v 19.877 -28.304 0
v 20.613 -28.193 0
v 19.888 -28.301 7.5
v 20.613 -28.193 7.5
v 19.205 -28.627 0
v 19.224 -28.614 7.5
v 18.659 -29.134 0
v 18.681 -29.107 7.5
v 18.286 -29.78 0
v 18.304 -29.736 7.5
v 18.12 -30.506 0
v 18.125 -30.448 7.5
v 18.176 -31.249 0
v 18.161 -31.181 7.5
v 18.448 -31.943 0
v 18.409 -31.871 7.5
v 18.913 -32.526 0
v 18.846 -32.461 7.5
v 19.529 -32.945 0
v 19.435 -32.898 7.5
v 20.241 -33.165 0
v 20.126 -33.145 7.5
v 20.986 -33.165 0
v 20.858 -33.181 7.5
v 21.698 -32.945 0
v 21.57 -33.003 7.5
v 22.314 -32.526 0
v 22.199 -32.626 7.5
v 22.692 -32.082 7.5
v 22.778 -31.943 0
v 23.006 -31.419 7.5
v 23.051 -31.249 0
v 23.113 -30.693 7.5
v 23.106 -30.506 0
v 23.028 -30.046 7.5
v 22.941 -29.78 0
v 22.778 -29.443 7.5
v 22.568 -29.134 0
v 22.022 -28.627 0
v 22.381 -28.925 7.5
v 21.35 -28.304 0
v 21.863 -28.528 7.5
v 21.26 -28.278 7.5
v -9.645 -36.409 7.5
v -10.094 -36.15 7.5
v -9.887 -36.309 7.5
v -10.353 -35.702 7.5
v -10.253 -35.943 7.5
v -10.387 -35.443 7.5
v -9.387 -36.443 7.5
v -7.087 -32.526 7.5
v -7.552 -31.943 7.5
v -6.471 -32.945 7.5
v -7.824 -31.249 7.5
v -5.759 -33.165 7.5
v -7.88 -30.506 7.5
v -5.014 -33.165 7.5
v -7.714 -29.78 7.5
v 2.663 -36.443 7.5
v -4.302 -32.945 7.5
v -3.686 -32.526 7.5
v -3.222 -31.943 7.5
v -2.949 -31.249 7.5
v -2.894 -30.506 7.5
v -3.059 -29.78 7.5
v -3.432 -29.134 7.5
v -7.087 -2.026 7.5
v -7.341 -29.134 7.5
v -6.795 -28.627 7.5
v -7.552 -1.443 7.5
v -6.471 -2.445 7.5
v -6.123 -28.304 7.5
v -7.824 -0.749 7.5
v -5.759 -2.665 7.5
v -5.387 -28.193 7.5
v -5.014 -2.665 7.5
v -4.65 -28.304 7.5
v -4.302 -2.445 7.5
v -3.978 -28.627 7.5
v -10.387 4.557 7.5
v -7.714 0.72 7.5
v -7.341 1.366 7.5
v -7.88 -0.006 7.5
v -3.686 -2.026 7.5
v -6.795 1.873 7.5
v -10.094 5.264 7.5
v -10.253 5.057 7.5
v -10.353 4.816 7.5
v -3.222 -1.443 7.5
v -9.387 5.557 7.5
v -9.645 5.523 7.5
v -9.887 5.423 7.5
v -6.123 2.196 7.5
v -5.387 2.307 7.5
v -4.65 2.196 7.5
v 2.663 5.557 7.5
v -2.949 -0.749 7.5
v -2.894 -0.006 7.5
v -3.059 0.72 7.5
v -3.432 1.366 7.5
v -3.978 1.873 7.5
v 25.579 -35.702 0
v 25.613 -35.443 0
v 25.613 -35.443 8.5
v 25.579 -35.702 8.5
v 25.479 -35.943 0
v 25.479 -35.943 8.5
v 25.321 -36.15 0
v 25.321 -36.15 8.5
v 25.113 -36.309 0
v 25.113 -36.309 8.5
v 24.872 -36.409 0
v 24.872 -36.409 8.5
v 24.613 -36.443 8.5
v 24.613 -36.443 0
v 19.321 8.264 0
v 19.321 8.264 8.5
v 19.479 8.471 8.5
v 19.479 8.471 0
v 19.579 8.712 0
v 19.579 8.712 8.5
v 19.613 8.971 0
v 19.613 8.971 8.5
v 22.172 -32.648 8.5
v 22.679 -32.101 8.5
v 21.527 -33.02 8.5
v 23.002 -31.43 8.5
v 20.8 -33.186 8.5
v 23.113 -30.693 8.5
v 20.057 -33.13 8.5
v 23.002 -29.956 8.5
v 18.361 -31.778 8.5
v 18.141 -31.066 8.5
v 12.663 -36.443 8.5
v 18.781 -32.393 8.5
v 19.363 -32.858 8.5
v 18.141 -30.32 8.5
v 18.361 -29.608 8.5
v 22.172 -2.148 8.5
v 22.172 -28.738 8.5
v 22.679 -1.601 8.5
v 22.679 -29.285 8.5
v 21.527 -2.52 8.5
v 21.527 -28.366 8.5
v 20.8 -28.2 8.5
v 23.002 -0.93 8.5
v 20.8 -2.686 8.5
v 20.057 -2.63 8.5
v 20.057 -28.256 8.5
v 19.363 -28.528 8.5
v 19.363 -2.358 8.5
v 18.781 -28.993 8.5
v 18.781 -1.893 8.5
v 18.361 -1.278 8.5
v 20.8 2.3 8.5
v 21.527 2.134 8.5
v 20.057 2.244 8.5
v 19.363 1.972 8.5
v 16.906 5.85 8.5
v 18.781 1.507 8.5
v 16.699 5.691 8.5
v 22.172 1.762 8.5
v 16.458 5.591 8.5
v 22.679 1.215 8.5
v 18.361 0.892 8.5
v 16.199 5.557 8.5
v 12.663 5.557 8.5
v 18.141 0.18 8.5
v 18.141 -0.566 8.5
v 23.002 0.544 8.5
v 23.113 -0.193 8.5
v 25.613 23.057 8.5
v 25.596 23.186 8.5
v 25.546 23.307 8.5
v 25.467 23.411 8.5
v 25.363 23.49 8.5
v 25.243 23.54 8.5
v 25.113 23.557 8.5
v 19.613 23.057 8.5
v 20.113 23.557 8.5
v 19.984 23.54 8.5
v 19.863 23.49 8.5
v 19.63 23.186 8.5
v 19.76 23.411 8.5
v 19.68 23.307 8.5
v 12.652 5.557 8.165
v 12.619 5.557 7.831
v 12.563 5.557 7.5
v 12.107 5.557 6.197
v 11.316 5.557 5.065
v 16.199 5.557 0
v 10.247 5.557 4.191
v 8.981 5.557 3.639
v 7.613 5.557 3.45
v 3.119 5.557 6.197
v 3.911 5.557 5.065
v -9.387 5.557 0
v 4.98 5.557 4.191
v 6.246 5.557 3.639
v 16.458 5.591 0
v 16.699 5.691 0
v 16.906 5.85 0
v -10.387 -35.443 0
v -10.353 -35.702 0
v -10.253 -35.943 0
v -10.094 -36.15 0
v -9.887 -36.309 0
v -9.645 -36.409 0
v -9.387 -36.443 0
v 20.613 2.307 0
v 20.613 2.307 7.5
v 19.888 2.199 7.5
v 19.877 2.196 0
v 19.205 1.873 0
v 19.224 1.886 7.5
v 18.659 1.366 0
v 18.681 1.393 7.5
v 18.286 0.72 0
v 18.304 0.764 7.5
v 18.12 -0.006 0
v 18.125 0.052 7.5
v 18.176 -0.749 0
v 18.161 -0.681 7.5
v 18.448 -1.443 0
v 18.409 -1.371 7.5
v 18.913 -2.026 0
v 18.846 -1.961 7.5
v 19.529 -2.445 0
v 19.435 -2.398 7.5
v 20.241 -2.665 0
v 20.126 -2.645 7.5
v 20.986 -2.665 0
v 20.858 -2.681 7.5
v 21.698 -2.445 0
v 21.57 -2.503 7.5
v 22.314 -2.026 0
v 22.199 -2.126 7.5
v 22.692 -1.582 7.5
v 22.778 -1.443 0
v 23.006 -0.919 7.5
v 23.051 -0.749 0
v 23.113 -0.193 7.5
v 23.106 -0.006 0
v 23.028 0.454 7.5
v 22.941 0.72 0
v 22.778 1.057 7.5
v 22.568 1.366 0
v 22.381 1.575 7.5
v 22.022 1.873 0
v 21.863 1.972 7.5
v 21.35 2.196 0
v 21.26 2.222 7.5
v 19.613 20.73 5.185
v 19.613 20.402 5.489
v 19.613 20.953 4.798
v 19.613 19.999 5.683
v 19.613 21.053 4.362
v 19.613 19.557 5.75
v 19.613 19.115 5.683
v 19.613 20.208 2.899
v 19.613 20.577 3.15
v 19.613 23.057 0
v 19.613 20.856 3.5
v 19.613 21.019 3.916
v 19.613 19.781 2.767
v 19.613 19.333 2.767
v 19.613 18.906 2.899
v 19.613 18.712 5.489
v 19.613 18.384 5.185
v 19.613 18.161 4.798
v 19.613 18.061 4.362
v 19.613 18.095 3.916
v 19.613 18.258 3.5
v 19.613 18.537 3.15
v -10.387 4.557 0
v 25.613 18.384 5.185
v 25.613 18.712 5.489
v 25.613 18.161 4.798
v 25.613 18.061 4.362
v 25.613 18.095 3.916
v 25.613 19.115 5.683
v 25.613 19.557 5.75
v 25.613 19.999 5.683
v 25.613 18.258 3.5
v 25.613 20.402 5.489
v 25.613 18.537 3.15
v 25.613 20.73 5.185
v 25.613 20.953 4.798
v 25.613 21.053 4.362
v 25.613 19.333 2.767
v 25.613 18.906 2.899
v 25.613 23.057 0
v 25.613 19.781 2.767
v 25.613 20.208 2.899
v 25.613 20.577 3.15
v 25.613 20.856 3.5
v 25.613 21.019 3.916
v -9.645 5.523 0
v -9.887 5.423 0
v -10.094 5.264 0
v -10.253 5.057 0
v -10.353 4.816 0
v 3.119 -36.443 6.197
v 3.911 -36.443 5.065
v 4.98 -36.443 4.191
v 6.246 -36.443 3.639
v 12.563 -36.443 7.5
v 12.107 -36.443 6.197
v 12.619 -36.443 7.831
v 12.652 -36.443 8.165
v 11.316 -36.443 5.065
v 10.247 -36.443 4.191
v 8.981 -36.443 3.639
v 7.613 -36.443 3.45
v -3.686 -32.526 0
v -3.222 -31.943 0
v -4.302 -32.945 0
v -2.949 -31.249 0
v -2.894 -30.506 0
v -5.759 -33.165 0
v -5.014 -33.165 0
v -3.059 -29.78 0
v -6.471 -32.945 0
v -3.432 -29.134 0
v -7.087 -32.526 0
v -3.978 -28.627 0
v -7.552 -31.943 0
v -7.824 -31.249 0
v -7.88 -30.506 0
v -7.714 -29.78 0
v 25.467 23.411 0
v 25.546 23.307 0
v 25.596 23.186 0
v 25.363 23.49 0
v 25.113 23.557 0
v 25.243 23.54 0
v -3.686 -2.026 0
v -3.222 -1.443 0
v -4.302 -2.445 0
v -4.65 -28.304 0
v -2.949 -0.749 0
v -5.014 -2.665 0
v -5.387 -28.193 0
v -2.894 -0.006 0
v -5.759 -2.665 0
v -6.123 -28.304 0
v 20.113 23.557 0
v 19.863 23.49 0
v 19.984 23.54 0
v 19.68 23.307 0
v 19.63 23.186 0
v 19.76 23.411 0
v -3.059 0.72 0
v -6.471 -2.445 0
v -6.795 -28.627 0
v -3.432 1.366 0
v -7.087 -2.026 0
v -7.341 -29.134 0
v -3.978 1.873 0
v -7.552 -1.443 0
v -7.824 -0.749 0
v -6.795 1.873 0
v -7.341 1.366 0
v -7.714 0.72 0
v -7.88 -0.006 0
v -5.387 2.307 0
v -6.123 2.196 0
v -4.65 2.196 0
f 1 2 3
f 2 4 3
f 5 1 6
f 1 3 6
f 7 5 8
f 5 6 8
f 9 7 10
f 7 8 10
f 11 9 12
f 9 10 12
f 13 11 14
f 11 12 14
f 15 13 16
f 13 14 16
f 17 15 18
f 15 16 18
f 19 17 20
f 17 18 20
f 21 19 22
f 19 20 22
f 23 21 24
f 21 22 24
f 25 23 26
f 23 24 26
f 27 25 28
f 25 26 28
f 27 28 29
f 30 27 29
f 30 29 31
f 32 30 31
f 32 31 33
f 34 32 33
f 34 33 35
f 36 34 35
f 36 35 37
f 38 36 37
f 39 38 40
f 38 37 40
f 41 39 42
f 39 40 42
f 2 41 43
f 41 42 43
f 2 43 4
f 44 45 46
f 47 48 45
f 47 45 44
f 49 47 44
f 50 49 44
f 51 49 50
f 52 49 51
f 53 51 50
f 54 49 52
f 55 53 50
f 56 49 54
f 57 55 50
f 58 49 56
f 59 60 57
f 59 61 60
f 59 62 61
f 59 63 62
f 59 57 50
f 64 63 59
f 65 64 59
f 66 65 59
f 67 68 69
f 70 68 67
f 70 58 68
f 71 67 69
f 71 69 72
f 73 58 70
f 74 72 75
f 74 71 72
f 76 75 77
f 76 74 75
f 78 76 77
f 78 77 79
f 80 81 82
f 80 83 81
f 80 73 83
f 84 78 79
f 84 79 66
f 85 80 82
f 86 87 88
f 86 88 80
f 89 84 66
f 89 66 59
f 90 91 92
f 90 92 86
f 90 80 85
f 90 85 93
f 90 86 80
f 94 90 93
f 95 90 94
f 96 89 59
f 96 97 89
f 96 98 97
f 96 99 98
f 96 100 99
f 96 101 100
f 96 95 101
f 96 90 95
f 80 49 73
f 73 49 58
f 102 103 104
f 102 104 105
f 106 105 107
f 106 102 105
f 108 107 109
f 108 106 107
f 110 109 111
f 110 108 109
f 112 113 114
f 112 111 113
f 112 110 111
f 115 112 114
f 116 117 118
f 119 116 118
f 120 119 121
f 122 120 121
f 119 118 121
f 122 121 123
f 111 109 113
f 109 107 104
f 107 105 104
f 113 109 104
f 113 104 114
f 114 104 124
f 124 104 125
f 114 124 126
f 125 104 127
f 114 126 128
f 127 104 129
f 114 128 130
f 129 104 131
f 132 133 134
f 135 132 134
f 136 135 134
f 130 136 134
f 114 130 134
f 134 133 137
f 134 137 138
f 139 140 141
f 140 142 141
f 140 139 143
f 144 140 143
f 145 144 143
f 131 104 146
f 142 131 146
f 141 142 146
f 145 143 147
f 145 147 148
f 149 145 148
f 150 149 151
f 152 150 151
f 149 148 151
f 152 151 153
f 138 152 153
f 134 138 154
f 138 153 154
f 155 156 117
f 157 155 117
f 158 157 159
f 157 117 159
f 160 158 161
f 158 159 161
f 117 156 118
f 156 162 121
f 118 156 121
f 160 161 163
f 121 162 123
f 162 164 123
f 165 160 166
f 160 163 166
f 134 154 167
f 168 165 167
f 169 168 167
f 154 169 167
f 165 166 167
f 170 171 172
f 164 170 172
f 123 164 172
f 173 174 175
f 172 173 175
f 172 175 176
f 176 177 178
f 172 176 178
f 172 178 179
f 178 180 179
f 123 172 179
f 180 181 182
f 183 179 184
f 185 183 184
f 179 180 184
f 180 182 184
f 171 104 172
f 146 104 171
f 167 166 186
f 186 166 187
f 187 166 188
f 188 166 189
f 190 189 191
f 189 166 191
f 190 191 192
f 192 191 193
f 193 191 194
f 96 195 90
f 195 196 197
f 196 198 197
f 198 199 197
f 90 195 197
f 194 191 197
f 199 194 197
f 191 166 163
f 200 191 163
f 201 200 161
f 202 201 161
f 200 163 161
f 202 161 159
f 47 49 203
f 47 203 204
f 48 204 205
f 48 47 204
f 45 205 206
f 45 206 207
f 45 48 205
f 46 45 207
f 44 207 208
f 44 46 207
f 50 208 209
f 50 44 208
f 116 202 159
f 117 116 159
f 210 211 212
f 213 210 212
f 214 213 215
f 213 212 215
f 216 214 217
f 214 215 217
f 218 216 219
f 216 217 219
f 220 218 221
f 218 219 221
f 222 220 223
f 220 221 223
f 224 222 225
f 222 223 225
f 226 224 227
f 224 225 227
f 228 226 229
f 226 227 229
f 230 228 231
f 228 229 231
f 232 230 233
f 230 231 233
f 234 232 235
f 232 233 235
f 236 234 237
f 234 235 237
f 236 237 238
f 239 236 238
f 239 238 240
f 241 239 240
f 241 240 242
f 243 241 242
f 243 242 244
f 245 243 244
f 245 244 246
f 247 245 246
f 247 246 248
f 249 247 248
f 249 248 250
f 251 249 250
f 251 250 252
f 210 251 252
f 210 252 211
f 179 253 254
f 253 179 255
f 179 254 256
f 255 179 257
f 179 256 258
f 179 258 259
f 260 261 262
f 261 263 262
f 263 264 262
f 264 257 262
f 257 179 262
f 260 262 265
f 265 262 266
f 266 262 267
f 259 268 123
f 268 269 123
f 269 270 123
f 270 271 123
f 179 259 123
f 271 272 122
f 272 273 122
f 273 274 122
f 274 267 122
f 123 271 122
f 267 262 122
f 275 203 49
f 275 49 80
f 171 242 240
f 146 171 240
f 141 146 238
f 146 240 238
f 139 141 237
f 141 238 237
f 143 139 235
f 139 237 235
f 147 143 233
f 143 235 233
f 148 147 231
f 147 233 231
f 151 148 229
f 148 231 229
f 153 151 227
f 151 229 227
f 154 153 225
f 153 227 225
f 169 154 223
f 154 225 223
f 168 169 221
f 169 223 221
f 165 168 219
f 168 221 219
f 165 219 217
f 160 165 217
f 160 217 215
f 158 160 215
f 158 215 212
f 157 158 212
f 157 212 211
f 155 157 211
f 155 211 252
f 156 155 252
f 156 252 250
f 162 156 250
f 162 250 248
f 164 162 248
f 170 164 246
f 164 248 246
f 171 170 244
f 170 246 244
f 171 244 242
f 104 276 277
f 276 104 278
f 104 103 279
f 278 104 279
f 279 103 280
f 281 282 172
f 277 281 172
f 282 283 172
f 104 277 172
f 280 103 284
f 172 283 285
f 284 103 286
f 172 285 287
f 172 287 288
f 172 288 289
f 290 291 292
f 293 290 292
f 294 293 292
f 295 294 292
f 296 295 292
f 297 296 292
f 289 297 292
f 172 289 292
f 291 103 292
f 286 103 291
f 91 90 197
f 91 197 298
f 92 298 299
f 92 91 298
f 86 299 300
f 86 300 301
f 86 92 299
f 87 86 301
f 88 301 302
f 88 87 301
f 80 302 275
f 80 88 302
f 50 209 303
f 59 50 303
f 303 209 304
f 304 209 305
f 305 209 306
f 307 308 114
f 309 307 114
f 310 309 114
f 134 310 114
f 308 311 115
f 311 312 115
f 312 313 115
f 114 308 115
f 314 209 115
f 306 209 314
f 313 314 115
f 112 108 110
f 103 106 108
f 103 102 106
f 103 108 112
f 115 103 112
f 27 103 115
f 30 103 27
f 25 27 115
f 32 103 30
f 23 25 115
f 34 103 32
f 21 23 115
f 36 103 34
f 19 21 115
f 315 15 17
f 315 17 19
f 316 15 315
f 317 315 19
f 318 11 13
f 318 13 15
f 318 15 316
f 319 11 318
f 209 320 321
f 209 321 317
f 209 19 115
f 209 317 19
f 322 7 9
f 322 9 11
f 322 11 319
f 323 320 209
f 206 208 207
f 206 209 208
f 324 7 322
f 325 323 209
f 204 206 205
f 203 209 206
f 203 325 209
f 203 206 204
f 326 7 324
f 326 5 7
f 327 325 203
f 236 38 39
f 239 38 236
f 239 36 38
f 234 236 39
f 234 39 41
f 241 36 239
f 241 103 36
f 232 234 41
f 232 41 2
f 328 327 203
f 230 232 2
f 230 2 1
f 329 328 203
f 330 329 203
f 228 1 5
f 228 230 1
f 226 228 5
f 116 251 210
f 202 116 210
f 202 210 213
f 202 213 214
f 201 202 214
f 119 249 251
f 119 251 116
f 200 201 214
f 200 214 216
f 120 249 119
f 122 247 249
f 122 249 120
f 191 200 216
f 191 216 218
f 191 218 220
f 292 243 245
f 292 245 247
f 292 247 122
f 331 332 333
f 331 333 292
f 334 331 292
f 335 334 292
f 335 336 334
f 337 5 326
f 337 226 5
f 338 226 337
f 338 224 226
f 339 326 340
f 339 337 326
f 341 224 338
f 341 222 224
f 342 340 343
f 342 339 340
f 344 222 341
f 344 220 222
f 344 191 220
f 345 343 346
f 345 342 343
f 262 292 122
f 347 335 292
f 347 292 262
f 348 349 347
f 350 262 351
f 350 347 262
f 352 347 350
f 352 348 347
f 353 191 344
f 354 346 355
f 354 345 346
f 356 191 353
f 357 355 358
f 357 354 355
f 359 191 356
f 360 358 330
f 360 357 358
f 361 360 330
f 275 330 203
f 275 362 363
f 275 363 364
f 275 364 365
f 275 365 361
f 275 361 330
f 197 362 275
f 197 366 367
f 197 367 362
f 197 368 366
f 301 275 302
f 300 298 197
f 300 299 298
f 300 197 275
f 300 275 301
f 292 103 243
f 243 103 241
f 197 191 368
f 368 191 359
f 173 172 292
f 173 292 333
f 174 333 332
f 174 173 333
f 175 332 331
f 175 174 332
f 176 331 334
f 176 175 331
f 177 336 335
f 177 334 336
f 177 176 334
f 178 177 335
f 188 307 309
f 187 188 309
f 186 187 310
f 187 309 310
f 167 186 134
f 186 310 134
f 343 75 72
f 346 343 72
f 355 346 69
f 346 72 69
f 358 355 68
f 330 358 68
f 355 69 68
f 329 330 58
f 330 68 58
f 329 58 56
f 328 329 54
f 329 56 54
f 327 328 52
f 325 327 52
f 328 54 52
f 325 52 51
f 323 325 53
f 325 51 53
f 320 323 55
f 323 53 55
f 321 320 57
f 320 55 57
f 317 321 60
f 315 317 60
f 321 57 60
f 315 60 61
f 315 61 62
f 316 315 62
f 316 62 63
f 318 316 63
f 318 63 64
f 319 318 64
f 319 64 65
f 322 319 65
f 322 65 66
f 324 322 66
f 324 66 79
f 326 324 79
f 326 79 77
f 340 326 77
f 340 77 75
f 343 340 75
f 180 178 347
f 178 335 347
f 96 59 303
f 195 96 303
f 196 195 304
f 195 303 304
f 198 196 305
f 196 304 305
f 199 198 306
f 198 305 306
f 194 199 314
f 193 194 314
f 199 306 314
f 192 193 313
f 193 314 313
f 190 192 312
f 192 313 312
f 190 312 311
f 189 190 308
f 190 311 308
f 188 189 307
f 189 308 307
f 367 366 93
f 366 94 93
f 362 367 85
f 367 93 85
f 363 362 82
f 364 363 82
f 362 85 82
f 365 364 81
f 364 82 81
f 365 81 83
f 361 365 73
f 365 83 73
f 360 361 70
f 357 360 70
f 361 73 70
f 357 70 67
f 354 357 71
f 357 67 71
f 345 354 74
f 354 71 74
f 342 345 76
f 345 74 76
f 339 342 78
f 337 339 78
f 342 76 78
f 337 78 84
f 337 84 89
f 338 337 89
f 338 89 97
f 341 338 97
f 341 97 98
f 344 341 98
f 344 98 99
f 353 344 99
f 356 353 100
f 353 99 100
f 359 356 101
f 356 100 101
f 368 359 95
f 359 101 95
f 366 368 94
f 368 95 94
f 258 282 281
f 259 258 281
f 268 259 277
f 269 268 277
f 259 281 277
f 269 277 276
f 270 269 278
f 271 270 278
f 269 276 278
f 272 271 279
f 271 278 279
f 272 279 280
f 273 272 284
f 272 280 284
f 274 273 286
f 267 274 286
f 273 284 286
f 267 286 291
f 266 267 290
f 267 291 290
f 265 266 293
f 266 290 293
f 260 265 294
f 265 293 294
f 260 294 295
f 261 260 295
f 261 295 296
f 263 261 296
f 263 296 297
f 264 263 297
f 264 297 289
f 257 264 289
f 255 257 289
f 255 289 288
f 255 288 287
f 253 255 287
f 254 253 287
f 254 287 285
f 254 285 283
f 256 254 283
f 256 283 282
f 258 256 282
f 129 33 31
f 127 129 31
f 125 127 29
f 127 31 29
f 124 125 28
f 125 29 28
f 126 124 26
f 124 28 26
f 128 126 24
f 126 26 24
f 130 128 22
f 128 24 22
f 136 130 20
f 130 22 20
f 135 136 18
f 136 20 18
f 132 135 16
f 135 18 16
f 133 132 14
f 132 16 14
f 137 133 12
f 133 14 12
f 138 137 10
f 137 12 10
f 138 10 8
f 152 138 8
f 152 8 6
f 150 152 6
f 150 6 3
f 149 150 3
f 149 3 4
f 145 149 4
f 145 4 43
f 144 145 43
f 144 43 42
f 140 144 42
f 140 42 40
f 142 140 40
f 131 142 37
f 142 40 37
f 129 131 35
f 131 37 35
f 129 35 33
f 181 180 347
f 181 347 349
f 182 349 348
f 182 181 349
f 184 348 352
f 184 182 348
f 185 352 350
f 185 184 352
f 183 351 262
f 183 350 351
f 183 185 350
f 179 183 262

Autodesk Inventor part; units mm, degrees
ref_plane "YZ Plane" through (0, 0, 0) normal (1, 0, 0) x (0, 1, 0)
ref_plane "XZ Plane" through (0, 0, 0) normal (0, 1, 0) x (-1, 0, 0)
ref_plane "XY Plane" through (0, 0, 0) normal (0, 0, 1) x (1, 0, 0)
sketch "Szkic1" plane through (0, 0, 0) normal (0, 0, 1) x (1, 0, 0)
  line L0 (-10.3866, 5.557) -> (25.6134, 5.557)
  line L1 (25.6134, 5.557) -> (25.6134, -36.443)
  line L2 (25.6134, -36.443) -> (-10.3866, -36.443)
  line L3 (-10.3866, -36.443) -> (-10.3866, 5.557)
  point P0 (0, 0)
  point P1 (20.6134, -0.193)
  point P2 (20.6134, -30.693)
  point P3 (-5.3866, -0.193)
  point P4 (-5.3866, -30.693)
  dimension "d0" = 36
  dimension "d1" = 42
  dimension "d2" = 5
  dimension "d3" = 5
  dimension "d4" = 5
  dimension "d5" = 5
  dimension "d6" = 5.75
  dimension "d7" = 5.75
  dimension "d8" = 5.75
  dimension "d9" = 5.75
extrude "Wyciągnięcie proste1" add sketch "Szkic1" along normal blind 7.5
hole "Otwór1" at (20.6134, -0.193, 0) at (20.6134, -30.693, 0) at (-5.3866, -0.193, 0) at (-5.3866, -30.693, 0) direction (0, 0, 1) diameter 5 end through all
sketch "Szkic2" plane through (-10.3866, -36.443, 0) normal (0, -1, 0) x (1, 0, 0)
  line L0 (36, 0) -> (0, 0) projected
  line L1 (36, 0) -> (36, 7.5) projected
  line L2 (0, 7.5) -> (36, 7.5) projected
  line L3 (0, 0) -> (0, 7.5) projected
  line L4 (36, 7.5) -> (0, 7.5) projected
  circle A0 centre (18, 8.5) radius 5.05
  point P0 (10.3866, 0)
  dimension "d19" = 36
  dimension "d25" = 8.5
  dimension "d26" = 18
  dimension "d27" = 10.1
extrude "Wyciągnięcie proste2" cut sketch "Szkic2" against normal through all contours A0 L2 | L2 A0
sketch "Szkic3" plane through (0, 0, 7.5) normal (0, 0, 1) x (1, 0, 0)
  line L0 (25.6134, 5.557) -> (12.5634, 5.557) projected
  line L1 (12.5634, 5.557) -> (12.5634, -36.443) projected
  line L2 (-10.3866, -36.443) -> (2.6634, -36.443) projected
  line L3 (25.6134, -36.443) -> (25.6134, 5.557) projected
  circle A0 centre (20.6134, -0.193) radius 2.5 projected
  circle A1 centre (20.6134, -30.693) radius 2.5 projected
  line L4 (12.5634, -36.443) -> (25.6134, -36.443) projected
  line L5 (2.6634, -36.443) -> (2.6634, 5.557) projected
  line L6 (2.6634, 5.557) -> (-10.3866, 5.557) projected
  line L7 (-10.3866, 5.557) -> (-10.3866, -36.443) projected
  point P0 (0, 0)
extrude "Wyciągnięcie proste3" add sketch "Szkic3" along normal blind 1 contours L3 L4 L1 L0
sketch "Szkic4" plane through (0, 0, 0) normal (0, 0, -1) x (-1, 0, 0)
  circle A0 centre (5.3866, -0.193) radius 2.5 projected
  circle A1 centre (-20.6134, -0.193) radius 2.5 projected
  circle A2 centre (-20.6134, -30.693) radius 2.5 projected
  circle A3 centre (5.3866, -30.693) radius 2.5 projected
  line L0 (10.3866, 5.557) -> (-25.6134, 5.557) projected
  line L1 (-25.6134, 5.557) -> (-25.6134, -36.443) projected
  line L2 (-25.6134, -36.443) -> (10.3866, -36.443) projected
  line L3 (10.3866, -36.443) -> (10.3866, 5.557) projected
  line L4 (-25.6134, 5.557) -> (-25.6134, 23.557)
  line L5 (-25.6134, 23.557) -> (-19.6134, 23.557)
  line L6 (-19.6134, 23.557) -> (-19.6134, 5.557)
  point P0 (0, 0)
  dimension "d30" = 18
  dimension "d31" = 6
extrude "Wyciągnięcie proste4" add sketch "Szkic4" against normal blind 8.5 contours L0 L4 L5 L6
sketch "Szkic5" plane through (19.6134, 5.557, 0) normal (-1, 0, 0) x (0, 0, 1)
  line L0 (0, 0) -> (0, 18) projected
  line L1 (8.5, 0) -> (0, 0) projected
  line L2 (8.5, 18) -> (8.5, 0) projected
  line L3 (0, 18) -> (8.5, 18) projected
  point P0 (0, -5.557)
  point P1 (4.25, 14)
  dimension "d34" = 4.25
  dimension "d35" = 4
  dimension "d47" = 8.5
hole "Otwór2" at (19.6134, 19.557, 4.25) direction (1, 0, 0) diameter 3 end through all
chamfer "Faza1" distance 3 angle 45 1 edges at (19.6134, 5.557, 4.25)
fillet "Zaokrąglenie2" radius 1 5 edges at (-10.3866, 5.557, 3.75) (-10.3866, -36.443, 3.75) (25.6134, -36.443, 4.25) (19.6134, 8.557, 4.25) (16.6134, 5.557, 4.25)
sketch "Szkic6" plane through (7.6134, -36.443, 8.5) normal (0, -1, 0) x (1, 0, 0)
  line L0 (17, 0) -> (17, -8.5) projected
  line L1 (4.95, 0) -> (17, 0) projected
  line L2 (4.95, -1) -> (4.95, 0) projected
  arc A0 (-4.95, -1) -> (4.95, -1) centre (0, 0) ccw projected
  line L3 (-17, -1) -> (-4.95, -1) projected
  line L4 (-17, -8.5) -> (-17, -1) projected
  line L5 (17, -8.5) -> (-17, -8.5) projected
  circle A1 centre (0, 0) radius 5.05
  point P0 (-7.6134, -8.5)
  dimension "d49" = 10.1
extrude "Wyciągnięcie proste5" cut sketch "Szkic6" against normal through all contours A1 L2 L1 | L1 L2 A0 A1
fillet "Zaokrąglenie3" radius 0.5 2 edges at (19.6134, 23.557, 4.25) (25.6134, 23.557, 4.25)
equation "\"d7\" = d6"
equation "\"d8\" = d7"
equation "\"d9\" = d6"
equation "\"d26\" = 0.5 * d19"
equation "\"d34\" = 0.5 * d47"
properties part number "3DP_ABS_X_Axis_Linear_Shaft_Clamp_Bottom_With_Endstop_Screw"
